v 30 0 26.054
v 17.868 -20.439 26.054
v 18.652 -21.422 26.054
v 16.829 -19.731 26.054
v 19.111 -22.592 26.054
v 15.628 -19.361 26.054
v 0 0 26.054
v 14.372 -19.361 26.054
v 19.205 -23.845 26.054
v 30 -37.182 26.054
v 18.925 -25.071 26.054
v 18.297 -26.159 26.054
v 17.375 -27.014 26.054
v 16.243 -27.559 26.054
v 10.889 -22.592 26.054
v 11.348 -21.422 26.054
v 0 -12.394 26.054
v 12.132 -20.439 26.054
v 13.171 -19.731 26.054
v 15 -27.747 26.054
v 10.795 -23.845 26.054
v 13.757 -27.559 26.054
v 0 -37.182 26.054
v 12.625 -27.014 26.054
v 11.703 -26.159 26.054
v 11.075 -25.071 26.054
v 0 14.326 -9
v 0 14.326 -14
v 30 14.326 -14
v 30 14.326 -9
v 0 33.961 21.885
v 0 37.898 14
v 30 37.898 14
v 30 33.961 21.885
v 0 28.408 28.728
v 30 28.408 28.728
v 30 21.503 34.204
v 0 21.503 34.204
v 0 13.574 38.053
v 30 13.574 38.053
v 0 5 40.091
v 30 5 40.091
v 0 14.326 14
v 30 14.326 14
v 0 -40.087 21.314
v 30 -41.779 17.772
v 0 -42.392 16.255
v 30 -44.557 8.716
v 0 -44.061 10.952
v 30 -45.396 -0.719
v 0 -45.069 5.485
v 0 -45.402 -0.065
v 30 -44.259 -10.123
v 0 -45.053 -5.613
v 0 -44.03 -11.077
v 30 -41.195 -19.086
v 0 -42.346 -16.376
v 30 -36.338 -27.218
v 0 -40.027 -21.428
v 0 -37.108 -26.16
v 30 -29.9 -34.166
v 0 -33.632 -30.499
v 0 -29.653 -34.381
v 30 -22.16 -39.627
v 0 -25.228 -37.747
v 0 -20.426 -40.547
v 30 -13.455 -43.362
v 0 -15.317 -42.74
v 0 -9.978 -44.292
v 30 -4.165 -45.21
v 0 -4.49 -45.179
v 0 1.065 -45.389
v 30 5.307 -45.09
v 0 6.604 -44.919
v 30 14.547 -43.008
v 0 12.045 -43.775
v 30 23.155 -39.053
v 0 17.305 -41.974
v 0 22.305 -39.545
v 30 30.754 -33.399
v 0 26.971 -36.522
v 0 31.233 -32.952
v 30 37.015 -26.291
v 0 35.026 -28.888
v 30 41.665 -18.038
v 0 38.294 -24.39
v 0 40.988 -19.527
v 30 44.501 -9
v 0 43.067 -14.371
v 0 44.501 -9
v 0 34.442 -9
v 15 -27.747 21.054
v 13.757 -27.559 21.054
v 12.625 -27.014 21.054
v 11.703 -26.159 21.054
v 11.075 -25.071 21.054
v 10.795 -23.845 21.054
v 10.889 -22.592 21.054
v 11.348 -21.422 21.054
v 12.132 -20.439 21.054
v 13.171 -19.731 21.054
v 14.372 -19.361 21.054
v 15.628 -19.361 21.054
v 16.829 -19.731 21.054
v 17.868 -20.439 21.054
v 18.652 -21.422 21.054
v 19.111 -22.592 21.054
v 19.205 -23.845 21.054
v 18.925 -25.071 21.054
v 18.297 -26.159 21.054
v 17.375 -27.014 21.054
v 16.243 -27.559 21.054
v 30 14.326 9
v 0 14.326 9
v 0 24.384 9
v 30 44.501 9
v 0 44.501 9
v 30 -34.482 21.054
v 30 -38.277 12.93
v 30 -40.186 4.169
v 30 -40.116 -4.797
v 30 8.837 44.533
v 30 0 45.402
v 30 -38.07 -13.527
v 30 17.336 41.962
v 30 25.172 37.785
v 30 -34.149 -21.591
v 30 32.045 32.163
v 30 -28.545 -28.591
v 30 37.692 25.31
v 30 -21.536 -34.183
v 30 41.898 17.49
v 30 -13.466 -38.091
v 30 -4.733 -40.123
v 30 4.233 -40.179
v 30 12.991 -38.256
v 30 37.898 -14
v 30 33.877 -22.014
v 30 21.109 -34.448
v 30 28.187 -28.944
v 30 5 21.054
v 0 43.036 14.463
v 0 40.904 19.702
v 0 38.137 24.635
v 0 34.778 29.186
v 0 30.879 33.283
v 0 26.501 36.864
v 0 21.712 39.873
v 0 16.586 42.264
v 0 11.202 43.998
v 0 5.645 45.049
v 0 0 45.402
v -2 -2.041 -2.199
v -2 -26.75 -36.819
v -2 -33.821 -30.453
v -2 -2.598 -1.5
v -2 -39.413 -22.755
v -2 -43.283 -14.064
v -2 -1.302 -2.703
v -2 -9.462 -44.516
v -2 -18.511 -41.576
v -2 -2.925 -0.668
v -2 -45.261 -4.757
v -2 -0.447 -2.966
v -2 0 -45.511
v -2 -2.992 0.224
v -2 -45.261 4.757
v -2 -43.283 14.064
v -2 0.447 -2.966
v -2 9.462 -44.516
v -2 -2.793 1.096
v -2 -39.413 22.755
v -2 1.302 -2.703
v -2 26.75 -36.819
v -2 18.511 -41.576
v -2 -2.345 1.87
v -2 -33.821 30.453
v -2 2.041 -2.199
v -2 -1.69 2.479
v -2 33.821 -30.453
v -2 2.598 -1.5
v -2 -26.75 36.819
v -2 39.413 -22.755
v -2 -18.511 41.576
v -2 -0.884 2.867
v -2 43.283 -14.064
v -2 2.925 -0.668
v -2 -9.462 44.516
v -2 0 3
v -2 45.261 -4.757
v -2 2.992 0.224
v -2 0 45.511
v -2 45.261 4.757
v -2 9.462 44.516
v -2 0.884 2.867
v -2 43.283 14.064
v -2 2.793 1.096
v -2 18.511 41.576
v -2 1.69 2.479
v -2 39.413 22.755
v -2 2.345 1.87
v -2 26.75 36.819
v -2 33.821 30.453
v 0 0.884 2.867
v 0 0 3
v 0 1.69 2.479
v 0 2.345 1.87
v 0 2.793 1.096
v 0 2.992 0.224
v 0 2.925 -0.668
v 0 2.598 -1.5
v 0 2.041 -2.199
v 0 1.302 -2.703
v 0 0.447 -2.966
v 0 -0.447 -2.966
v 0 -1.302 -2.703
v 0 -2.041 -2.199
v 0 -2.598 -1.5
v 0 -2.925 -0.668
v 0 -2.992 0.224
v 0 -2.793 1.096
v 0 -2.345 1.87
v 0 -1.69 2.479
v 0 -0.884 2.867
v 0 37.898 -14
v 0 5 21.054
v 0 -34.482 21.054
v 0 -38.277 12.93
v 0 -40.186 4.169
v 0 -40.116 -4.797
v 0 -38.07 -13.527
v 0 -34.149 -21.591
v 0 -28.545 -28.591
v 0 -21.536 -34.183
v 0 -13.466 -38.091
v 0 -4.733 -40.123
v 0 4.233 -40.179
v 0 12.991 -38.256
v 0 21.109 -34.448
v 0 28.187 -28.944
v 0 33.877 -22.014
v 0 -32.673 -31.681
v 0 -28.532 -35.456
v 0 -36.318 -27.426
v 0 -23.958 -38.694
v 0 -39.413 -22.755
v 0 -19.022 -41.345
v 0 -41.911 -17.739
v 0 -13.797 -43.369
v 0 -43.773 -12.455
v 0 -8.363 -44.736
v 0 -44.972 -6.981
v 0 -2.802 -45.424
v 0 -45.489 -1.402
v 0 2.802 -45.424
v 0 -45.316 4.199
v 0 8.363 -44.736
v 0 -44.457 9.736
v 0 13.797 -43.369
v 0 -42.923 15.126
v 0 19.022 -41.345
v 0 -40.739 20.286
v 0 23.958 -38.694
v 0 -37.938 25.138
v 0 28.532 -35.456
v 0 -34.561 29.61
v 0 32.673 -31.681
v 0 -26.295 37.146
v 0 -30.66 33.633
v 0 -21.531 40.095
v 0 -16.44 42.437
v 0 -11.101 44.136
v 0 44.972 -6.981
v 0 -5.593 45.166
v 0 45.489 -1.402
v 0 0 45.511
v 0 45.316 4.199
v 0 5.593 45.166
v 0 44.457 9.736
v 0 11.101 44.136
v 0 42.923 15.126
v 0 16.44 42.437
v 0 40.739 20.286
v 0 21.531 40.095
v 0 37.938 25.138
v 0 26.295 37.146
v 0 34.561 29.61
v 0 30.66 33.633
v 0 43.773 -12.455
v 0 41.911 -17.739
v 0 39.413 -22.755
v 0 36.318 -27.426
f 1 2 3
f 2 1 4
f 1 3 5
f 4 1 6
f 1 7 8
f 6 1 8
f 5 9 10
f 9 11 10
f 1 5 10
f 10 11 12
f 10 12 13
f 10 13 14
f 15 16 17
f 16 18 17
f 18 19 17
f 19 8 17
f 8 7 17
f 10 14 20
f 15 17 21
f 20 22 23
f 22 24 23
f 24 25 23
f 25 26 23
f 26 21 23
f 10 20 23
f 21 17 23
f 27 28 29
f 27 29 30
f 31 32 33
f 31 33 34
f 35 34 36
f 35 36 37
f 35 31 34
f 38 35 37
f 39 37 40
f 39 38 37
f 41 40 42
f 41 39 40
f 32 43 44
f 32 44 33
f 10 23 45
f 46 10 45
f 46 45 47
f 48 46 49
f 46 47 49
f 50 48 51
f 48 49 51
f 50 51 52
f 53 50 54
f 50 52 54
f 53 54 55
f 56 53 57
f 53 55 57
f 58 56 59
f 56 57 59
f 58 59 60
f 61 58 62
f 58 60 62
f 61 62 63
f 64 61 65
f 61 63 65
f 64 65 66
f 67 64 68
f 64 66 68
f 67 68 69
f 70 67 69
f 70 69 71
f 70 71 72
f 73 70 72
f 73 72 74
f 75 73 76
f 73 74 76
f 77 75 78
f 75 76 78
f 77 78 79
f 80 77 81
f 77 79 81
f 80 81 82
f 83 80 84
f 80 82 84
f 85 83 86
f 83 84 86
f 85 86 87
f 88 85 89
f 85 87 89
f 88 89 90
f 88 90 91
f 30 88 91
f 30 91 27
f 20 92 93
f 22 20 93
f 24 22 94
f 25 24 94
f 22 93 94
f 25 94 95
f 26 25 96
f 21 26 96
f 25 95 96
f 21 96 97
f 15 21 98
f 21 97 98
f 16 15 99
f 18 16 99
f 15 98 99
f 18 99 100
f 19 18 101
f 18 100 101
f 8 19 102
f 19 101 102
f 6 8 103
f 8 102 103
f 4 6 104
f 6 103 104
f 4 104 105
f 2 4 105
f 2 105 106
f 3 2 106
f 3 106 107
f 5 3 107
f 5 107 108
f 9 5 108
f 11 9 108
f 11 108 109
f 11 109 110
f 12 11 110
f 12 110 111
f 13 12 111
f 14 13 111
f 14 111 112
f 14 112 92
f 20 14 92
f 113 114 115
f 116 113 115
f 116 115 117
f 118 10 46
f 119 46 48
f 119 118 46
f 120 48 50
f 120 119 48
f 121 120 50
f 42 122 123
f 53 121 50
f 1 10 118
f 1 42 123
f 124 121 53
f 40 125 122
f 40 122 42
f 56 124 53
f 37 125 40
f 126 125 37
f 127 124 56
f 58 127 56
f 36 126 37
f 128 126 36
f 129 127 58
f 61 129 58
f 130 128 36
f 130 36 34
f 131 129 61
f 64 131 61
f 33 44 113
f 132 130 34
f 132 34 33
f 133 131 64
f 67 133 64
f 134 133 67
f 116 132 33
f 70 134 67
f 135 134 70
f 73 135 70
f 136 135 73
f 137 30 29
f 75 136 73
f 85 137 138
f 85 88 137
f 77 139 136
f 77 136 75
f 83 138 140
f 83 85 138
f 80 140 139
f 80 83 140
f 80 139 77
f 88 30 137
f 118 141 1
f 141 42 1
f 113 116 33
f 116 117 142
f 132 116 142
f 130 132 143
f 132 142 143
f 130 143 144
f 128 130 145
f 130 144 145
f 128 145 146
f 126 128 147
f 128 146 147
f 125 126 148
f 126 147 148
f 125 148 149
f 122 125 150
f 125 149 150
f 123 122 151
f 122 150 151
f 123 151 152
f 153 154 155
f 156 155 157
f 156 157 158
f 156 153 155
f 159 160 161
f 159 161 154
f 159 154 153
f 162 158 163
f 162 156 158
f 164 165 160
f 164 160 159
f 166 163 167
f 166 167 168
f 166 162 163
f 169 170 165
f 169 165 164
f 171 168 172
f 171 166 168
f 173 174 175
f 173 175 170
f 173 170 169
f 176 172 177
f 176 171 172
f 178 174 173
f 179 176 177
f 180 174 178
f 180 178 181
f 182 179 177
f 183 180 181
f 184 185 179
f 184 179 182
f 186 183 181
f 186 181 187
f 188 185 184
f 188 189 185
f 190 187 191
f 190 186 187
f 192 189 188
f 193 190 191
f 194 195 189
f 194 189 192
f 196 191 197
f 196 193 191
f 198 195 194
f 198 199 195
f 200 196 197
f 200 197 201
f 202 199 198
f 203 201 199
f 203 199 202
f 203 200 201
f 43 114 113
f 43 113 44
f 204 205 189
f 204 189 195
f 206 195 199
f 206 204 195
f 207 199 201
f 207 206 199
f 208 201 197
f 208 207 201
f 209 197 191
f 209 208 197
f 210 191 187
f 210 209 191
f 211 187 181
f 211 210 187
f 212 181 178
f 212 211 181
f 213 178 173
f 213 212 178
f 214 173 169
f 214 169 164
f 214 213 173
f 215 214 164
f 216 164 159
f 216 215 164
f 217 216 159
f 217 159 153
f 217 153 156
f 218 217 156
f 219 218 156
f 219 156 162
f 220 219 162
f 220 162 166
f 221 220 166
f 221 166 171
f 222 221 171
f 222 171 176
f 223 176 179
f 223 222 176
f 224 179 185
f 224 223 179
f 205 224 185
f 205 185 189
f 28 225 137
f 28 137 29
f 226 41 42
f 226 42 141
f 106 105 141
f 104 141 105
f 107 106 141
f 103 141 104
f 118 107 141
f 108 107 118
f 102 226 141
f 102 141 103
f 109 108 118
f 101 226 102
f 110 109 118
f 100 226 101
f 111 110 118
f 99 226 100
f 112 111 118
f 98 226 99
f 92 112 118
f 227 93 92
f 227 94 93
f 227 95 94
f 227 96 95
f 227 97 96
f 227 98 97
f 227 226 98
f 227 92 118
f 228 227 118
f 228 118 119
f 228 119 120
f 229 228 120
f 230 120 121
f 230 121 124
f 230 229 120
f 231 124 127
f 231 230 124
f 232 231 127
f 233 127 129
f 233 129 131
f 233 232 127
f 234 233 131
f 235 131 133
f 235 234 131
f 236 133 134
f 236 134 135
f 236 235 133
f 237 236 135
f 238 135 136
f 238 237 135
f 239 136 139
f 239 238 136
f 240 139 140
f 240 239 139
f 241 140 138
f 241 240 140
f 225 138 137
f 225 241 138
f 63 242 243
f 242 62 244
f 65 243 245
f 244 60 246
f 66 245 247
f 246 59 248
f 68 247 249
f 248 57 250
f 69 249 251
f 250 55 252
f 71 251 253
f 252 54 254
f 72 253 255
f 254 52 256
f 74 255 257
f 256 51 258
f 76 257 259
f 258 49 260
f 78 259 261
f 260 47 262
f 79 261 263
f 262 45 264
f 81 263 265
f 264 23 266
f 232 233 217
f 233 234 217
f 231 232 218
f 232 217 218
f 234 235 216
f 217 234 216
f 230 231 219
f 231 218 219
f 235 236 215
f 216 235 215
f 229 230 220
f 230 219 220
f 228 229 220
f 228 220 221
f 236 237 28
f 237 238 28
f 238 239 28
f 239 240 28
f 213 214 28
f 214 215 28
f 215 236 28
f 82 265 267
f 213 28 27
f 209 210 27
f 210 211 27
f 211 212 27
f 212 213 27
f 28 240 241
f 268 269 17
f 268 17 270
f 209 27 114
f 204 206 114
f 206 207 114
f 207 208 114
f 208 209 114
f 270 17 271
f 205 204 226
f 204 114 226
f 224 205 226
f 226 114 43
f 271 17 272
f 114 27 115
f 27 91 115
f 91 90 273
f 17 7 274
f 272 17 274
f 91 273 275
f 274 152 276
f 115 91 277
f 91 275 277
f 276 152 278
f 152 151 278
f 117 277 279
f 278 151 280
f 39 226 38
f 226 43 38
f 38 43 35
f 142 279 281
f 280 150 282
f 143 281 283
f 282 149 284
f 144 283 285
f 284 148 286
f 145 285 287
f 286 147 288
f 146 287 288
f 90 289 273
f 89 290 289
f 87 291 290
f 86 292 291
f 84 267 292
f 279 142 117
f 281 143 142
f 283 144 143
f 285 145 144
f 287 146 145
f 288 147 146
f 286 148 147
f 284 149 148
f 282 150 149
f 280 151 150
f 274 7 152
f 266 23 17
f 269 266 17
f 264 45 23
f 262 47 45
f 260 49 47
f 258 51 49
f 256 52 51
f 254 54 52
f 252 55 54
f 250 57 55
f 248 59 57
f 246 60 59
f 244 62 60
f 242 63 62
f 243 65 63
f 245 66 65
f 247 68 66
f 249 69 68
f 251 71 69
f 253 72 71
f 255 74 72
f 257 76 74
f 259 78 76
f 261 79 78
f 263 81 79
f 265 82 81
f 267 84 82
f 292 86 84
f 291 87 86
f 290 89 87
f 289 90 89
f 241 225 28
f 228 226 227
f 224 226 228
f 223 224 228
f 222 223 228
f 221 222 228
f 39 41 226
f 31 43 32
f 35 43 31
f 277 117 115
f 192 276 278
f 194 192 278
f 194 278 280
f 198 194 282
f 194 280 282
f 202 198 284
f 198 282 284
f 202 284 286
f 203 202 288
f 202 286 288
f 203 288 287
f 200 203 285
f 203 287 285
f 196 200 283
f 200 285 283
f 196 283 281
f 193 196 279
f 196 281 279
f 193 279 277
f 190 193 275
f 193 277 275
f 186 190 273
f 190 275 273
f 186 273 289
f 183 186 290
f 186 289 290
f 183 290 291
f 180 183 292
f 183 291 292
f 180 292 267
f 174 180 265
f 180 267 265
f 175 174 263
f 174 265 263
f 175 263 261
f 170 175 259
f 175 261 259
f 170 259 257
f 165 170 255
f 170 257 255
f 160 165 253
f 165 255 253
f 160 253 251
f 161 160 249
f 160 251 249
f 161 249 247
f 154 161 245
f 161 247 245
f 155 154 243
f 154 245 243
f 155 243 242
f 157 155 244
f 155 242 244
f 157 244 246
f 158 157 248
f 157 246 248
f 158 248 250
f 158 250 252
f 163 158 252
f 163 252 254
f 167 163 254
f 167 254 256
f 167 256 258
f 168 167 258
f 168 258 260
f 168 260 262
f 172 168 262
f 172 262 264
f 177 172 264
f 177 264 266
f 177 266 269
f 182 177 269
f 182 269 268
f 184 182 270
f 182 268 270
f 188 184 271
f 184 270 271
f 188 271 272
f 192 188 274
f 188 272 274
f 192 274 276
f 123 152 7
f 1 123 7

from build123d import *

# Parameters (mm, degrees)
ESTRUSIONE_ESTRUSIONE1_DEPTH = 30
SVUOTA4_DEPTH                = 30
SCHIZZO2_R                   = 45.510557865
SCHIZZO2_R_2                 = 3
ESTRUSIONE_ESTRUSIONE2_DEPTH = 2
FORO_PER_VITE_5_16_1_D       = 8.4328
FORO_PER_VITE_5_16_1_DEPTH   = 5


# Read off the part's stored shape, not the designer's step: Svuota4
with BuildPart() as part:
    # Schizzo1 → Estrusione-Estrusione1 (new body)
    with BuildSketch(Plane(origin=(0, 0, 0), x_dir=(0, 0, -1), z_dir=(1, 0, 0))):
        with BuildLine():
            Line((-45.401622395, 0), (-26.054049287, 0))
            Line((-26.054049287, 0), (-26.054049287, -37.181901939))
            ThreePointArc((-26.054049287, -37.181901939), (41.721933403, -17.904959905), (9, 44.500643996))
            Line((9, 44.500643996), (9, 14.325779192))
            Line((9, 14.325779192), (-9, 14.325779192))
            Line((-9, 14.325779192), (-9, 44.500643996))
            ThreePointArc((-9, 44.500643996), (-35.142011309, 28.74624075), (-45.401622395, 0))
        make_face()
    extrude(amount=ESTRUSIONE_ESTRUSIONE1_DEPTH)

    # Svuota4 outline → Svuota4 (cut)
    with BuildSketch(Plane.YZ):
        with BuildLine():
            Line((14.325779192, -14), (14.325779192, 14))
            Line((14.325779192, 14), (37.898431262, 14))
            ThreePointArc((37.898431262, 14), (25.104867632, 31.654963486), (5, 40.091035059))
            Line((5, 40.091035059), (5, 21.054049287))
            Line((5, 21.054049287), (-34.482141765, 21.054049287))
            ThreePointArc((-34.482141765, 21.054049287), (-17.610063922, -36.361748319), (37.898431262, -14))
            Line((37.898431262, -14), (14.325779192, -14))
        make_face()
    extrude(amount=SVUOTA4_DEPTH, mode=Mode.SUBTRACT)

    # Schizzo2 → Estrusione-Estrusione2 (add)
    with BuildSketch(Plane.ZY):
        Circle(SCHIZZO2_R)
        Circle(SCHIZZO2_R_2, mode=Mode.SUBTRACT)
    extrude(amount=ESTRUSIONE_ESTRUSIONE2_DEPTH)

    # Foro per Vite 5/16-1
    with Locations(Plane(origin=(15, -23.530287744, 26.054049287), x_dir=(0, 1, 0), z_dir=(0, 0, 1))):
        with Locations((0, 0)):
            Hole(FORO_PER_VITE_5_16_1_D / 2, depth=FORO_PER_VITE_5_16_1_DEPTH)


solid = part.part
